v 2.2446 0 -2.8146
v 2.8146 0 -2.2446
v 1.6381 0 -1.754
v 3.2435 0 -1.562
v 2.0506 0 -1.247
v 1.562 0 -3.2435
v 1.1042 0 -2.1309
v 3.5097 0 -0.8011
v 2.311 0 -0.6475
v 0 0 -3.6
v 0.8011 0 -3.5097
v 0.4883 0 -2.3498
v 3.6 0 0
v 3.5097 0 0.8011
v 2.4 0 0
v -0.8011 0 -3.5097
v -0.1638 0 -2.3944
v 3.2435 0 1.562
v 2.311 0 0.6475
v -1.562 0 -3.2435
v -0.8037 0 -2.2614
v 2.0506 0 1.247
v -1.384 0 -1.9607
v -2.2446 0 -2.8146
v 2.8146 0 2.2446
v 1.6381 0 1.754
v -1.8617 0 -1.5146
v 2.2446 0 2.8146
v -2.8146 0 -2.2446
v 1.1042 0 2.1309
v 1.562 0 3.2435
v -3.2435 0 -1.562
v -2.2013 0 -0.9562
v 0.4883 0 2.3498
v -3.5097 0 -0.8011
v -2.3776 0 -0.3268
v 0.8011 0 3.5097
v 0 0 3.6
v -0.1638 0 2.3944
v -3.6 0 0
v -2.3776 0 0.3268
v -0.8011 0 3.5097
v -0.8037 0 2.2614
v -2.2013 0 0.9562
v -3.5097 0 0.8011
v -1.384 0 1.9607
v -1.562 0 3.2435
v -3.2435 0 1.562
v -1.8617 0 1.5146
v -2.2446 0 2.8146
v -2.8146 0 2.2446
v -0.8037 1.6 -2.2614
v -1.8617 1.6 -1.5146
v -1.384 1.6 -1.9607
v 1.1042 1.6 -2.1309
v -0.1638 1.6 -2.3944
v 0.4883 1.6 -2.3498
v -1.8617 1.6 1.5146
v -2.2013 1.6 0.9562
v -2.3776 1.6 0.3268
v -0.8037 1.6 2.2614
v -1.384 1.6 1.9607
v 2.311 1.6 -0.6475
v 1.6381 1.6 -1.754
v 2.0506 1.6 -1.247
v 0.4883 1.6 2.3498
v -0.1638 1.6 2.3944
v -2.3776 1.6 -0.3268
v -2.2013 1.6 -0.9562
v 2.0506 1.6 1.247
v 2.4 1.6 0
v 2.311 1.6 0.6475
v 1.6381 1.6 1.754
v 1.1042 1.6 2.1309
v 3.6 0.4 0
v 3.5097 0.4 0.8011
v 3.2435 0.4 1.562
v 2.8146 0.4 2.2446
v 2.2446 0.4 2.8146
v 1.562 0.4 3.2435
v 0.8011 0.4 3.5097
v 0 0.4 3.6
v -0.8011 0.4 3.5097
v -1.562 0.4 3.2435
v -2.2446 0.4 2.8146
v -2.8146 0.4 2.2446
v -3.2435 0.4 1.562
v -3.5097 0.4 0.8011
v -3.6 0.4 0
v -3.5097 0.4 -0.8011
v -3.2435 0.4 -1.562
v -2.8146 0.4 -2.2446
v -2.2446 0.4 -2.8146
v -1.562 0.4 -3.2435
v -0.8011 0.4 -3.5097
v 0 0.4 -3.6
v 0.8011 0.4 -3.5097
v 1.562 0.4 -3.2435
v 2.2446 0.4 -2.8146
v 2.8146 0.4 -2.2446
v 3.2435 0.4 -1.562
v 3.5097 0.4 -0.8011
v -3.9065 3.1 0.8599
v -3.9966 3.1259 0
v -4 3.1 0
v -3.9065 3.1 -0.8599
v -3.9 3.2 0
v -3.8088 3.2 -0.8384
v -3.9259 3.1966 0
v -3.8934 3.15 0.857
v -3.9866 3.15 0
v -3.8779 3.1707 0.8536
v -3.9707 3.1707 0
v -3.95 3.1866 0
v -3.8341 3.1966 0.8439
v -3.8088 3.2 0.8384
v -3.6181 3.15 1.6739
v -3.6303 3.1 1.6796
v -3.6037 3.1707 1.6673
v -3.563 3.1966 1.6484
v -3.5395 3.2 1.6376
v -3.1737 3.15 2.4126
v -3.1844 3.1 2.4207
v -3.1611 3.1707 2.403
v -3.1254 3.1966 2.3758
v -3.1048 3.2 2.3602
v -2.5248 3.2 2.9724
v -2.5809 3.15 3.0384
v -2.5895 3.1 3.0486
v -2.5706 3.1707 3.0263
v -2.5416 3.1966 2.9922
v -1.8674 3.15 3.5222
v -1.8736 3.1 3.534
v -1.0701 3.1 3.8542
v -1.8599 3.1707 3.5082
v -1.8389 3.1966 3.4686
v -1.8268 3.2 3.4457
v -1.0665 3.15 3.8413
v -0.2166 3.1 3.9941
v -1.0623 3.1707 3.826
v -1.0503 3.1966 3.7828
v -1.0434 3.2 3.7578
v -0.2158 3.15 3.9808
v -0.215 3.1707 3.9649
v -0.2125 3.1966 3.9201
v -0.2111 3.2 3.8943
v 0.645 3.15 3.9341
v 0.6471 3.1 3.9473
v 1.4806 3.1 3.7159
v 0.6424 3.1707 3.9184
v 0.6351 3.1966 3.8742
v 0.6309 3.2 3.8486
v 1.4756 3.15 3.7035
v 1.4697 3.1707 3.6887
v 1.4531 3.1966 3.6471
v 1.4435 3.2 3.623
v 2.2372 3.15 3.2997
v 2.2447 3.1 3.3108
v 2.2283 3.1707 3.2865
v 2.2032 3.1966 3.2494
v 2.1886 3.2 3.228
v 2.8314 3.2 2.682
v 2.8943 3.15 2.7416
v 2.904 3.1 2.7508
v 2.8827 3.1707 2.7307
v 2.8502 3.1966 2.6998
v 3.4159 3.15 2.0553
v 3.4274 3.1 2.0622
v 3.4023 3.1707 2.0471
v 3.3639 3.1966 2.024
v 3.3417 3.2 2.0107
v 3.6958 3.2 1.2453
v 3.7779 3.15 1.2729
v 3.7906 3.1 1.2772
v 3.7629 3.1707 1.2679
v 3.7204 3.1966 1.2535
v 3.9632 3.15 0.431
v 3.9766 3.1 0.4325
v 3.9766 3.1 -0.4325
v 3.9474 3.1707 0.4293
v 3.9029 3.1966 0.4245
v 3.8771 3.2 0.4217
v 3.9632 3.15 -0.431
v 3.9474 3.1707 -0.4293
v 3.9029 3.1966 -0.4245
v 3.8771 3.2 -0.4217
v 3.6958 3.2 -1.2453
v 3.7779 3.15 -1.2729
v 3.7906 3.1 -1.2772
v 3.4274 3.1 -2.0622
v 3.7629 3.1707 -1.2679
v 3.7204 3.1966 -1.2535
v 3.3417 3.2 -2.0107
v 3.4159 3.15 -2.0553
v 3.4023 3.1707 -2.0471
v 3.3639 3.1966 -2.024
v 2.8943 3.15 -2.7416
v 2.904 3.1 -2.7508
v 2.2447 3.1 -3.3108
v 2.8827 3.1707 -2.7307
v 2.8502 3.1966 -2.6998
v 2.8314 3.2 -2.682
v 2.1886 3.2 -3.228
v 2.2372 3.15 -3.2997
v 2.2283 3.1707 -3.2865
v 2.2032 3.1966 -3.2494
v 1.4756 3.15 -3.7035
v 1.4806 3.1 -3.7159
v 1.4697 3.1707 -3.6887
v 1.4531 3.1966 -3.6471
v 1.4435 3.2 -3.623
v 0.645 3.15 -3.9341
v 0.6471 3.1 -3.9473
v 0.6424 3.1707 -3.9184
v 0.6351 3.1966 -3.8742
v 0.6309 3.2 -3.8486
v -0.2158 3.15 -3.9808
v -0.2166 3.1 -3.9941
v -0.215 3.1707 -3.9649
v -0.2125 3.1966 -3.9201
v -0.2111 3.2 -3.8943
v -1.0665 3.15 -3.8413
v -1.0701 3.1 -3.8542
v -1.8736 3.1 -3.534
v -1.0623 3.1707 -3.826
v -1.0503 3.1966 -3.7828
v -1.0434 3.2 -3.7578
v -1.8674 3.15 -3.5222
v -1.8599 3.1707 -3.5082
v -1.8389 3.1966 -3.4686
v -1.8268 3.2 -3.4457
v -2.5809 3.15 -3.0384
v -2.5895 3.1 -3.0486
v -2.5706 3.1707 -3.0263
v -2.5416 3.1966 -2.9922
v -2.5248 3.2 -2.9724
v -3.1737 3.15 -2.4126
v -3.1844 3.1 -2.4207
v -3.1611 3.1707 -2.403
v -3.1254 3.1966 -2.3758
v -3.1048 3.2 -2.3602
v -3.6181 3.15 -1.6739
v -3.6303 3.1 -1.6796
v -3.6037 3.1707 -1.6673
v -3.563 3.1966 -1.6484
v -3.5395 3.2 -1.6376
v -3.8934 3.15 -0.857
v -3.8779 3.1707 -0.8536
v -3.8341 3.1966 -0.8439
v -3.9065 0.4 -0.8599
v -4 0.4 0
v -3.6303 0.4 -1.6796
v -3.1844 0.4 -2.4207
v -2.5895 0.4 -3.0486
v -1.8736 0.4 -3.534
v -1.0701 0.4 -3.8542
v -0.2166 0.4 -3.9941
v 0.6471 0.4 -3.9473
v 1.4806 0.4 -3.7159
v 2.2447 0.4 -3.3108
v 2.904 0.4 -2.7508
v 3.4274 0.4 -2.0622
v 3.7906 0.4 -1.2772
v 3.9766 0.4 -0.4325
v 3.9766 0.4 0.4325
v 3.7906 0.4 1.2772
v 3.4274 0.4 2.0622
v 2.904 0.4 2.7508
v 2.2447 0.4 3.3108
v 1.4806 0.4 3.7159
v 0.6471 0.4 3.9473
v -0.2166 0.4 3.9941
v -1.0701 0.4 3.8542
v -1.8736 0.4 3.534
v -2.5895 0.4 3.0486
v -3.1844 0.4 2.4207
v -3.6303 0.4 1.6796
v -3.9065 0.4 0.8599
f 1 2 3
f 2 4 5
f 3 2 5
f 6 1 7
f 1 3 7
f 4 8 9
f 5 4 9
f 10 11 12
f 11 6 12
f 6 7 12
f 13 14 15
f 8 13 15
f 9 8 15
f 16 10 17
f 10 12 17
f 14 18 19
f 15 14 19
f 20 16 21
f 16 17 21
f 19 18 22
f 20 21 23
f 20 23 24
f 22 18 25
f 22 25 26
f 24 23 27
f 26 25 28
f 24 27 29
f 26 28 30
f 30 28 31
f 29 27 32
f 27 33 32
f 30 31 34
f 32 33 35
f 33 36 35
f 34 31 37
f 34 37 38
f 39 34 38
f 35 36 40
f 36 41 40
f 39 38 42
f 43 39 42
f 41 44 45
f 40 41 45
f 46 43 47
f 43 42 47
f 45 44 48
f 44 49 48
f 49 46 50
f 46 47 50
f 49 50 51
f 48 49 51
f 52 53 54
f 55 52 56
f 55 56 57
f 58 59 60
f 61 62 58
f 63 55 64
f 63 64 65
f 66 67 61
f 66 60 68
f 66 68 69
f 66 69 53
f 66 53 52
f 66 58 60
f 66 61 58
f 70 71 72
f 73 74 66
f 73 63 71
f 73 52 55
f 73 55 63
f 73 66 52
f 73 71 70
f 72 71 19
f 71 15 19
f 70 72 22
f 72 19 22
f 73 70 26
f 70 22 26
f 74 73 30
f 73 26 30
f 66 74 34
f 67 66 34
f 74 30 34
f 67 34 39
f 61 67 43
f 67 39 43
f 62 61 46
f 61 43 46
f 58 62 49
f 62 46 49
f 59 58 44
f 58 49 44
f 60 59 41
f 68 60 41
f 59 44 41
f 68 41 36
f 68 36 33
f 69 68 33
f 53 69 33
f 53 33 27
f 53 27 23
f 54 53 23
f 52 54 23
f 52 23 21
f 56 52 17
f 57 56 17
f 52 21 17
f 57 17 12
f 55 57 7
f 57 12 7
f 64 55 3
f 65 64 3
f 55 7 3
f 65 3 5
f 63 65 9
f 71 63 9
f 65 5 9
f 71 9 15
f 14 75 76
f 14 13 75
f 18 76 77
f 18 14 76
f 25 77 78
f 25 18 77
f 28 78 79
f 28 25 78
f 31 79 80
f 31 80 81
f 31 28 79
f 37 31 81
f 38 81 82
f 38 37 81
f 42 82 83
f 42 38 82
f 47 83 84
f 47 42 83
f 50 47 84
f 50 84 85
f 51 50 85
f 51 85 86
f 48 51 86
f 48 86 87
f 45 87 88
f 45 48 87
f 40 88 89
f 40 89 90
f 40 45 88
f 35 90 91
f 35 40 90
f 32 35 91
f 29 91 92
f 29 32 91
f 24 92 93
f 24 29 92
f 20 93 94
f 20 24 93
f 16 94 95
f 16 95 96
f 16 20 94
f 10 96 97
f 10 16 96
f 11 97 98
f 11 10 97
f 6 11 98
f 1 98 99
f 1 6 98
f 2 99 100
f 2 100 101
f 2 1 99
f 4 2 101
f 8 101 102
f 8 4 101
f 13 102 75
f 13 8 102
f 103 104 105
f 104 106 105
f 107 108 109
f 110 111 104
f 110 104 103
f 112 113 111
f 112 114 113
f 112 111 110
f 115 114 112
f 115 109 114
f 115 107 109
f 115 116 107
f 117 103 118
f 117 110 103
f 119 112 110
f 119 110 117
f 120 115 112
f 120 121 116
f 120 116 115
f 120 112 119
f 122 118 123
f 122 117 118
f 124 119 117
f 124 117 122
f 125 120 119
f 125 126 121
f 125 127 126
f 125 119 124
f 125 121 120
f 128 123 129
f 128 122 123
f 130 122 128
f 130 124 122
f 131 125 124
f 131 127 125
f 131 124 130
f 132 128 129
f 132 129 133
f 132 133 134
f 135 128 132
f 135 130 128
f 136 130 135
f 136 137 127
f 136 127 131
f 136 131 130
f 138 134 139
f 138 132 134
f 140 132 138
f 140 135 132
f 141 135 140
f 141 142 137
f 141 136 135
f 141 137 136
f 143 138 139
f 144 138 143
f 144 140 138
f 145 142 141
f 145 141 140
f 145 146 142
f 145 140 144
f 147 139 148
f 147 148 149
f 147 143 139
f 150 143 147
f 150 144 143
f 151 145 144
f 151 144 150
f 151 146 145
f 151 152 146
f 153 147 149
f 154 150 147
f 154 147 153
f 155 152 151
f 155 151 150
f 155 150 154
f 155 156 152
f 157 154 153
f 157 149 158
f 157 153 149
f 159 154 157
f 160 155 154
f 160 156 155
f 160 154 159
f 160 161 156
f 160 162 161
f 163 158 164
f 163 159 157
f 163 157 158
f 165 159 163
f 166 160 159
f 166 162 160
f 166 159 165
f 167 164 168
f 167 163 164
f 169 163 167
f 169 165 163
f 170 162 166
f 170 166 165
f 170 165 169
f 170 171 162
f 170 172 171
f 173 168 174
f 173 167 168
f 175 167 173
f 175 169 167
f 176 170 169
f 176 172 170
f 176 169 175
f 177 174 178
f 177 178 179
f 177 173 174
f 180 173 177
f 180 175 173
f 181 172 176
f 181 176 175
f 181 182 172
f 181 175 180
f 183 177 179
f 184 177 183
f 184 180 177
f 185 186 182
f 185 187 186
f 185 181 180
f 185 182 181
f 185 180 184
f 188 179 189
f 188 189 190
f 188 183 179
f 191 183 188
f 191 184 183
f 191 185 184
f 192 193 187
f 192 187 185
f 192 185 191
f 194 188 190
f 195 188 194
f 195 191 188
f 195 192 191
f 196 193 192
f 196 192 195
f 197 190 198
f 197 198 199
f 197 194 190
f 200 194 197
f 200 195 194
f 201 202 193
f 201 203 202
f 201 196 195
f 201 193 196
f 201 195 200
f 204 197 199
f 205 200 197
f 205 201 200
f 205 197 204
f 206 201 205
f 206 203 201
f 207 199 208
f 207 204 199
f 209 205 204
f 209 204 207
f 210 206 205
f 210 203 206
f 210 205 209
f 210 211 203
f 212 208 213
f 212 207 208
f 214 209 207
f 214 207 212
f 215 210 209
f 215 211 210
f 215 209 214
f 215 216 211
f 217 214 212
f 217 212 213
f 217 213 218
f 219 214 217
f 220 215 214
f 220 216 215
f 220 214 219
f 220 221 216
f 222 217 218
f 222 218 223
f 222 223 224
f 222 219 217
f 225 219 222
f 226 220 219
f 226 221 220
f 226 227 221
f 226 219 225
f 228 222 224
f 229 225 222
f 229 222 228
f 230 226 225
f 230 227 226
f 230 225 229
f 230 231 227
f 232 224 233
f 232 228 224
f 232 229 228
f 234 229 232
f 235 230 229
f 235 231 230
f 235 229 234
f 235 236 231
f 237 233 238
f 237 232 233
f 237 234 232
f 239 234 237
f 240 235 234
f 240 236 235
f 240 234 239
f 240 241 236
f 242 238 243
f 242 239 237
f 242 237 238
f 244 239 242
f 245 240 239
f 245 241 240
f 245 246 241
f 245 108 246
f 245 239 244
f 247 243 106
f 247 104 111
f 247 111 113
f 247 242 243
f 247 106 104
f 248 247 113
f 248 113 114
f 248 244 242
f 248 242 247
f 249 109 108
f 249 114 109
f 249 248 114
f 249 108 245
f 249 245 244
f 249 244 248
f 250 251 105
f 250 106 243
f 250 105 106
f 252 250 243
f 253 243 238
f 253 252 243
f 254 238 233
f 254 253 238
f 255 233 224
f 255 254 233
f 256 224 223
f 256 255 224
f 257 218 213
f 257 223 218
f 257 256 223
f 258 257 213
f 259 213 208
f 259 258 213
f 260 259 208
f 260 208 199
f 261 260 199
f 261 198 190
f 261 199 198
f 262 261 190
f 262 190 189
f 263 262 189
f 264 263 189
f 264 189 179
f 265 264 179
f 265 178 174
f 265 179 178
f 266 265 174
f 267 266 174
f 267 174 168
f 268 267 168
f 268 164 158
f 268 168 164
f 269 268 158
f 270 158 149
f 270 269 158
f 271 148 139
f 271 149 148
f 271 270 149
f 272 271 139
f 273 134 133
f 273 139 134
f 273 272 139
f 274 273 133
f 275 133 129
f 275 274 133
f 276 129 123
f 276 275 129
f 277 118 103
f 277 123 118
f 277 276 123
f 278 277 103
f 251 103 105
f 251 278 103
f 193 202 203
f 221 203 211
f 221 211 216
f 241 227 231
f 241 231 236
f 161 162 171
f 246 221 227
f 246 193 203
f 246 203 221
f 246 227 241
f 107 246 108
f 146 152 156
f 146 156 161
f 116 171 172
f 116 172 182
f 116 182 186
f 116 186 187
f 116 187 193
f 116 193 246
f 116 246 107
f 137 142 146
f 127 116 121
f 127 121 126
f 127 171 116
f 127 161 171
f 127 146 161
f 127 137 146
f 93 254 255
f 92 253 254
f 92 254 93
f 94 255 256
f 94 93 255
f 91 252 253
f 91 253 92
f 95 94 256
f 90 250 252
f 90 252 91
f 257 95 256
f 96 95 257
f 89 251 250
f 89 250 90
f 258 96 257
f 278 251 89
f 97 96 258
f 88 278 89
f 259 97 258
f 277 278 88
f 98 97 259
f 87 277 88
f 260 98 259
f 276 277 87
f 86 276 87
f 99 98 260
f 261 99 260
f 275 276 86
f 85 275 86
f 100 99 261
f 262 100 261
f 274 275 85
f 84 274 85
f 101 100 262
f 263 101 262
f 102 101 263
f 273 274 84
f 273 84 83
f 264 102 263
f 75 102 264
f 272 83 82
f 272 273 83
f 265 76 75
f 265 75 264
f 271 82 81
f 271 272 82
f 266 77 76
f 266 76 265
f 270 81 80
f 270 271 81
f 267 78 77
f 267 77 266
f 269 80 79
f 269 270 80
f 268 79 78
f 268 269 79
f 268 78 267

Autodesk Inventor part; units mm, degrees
ref_plane "YZ Plane" through (0, 0, 0) normal (1, 0, 0) x (0, 1, 0)
ref_plane "XZ Plane" through (0, 0, 0) normal (0, 1, 0) x (-1, 0, 0)
ref_plane "XY Plane" through (0, 0, 0) normal (0, 0, 1) x (1, 0, 0)
sketch "Sketch2" plane through (0, 0, 0) normal (0, 1, 0) x (-1, 0, 0)
  line L0 (-4, 4) -> (4, 4) construction
  line L1 (4, 4) -> (4, -4) construction
  line L2 (4, -4) -> (-4, -4) construction
  line L3 (-4, -4) -> (-4, 4) construction
  circle A0 centre (0, 0) radius 4
  point P0 (0, 4)
  point P1 (-4, 0)
  dimension "d0" = 8
  dimension "d1" = 8
extrude "Extrusion1" add sketch "Sketch2" along normal blind 3.2
sketch "Sketch10" plane through (0, 0, 0) normal (0, -1, 0) x (1, 0, 0)
  circle A0 centre (0, 0) radius 4 projected
  circle A1 centre (4, 4) radius 2.4 construction
  line L0 (0, 0) -> (4, 4) construction
  circle A2 centre (0, 0) radius 3.2569
  circle A3 centre (0, 0) radius 2.4
  circle A4 centre (0, 0) radius 3.6
  dimension "d92" = 4.8
  dimension "d93" = 4
  dimension "d94" = 4
  dimension "d95" = 4.8
  dimension "d99" = 0.4
extrude "Extrusion6" cut sketch "Sketch10" against normal blind 1.6 contours A3
extrude "Extrusion7" cut sketch "Sketch10" against normal blind 0.4 contours A0
fillet "Fillet1" radius 0.1 1 edges at (4, 3.2, 0)
equation "\"d4\" = 0.333333 * lh"
equation "\"d92\" = kd"
equation "\"d93\" = 0.5 * lu"
equation "\"d94\" = d93"
equation "\"d95\" = kd"
equation "\"d99\" = gw"
equation "\"d96\" = 0.333333 * lh - topthk"
equation "\"d100\" = gh"
equation "\"lh\" = 9.6"
equation "\"kd\" = 4.8"
equation "\"lu\" = 8"
equation "\"gw\" = 0.4"
equation "\"topthk\" = 1.6"
equation "\"gh\" = 0.4"
properties part number "98138-TransOrange" material "Polycarbonate"
